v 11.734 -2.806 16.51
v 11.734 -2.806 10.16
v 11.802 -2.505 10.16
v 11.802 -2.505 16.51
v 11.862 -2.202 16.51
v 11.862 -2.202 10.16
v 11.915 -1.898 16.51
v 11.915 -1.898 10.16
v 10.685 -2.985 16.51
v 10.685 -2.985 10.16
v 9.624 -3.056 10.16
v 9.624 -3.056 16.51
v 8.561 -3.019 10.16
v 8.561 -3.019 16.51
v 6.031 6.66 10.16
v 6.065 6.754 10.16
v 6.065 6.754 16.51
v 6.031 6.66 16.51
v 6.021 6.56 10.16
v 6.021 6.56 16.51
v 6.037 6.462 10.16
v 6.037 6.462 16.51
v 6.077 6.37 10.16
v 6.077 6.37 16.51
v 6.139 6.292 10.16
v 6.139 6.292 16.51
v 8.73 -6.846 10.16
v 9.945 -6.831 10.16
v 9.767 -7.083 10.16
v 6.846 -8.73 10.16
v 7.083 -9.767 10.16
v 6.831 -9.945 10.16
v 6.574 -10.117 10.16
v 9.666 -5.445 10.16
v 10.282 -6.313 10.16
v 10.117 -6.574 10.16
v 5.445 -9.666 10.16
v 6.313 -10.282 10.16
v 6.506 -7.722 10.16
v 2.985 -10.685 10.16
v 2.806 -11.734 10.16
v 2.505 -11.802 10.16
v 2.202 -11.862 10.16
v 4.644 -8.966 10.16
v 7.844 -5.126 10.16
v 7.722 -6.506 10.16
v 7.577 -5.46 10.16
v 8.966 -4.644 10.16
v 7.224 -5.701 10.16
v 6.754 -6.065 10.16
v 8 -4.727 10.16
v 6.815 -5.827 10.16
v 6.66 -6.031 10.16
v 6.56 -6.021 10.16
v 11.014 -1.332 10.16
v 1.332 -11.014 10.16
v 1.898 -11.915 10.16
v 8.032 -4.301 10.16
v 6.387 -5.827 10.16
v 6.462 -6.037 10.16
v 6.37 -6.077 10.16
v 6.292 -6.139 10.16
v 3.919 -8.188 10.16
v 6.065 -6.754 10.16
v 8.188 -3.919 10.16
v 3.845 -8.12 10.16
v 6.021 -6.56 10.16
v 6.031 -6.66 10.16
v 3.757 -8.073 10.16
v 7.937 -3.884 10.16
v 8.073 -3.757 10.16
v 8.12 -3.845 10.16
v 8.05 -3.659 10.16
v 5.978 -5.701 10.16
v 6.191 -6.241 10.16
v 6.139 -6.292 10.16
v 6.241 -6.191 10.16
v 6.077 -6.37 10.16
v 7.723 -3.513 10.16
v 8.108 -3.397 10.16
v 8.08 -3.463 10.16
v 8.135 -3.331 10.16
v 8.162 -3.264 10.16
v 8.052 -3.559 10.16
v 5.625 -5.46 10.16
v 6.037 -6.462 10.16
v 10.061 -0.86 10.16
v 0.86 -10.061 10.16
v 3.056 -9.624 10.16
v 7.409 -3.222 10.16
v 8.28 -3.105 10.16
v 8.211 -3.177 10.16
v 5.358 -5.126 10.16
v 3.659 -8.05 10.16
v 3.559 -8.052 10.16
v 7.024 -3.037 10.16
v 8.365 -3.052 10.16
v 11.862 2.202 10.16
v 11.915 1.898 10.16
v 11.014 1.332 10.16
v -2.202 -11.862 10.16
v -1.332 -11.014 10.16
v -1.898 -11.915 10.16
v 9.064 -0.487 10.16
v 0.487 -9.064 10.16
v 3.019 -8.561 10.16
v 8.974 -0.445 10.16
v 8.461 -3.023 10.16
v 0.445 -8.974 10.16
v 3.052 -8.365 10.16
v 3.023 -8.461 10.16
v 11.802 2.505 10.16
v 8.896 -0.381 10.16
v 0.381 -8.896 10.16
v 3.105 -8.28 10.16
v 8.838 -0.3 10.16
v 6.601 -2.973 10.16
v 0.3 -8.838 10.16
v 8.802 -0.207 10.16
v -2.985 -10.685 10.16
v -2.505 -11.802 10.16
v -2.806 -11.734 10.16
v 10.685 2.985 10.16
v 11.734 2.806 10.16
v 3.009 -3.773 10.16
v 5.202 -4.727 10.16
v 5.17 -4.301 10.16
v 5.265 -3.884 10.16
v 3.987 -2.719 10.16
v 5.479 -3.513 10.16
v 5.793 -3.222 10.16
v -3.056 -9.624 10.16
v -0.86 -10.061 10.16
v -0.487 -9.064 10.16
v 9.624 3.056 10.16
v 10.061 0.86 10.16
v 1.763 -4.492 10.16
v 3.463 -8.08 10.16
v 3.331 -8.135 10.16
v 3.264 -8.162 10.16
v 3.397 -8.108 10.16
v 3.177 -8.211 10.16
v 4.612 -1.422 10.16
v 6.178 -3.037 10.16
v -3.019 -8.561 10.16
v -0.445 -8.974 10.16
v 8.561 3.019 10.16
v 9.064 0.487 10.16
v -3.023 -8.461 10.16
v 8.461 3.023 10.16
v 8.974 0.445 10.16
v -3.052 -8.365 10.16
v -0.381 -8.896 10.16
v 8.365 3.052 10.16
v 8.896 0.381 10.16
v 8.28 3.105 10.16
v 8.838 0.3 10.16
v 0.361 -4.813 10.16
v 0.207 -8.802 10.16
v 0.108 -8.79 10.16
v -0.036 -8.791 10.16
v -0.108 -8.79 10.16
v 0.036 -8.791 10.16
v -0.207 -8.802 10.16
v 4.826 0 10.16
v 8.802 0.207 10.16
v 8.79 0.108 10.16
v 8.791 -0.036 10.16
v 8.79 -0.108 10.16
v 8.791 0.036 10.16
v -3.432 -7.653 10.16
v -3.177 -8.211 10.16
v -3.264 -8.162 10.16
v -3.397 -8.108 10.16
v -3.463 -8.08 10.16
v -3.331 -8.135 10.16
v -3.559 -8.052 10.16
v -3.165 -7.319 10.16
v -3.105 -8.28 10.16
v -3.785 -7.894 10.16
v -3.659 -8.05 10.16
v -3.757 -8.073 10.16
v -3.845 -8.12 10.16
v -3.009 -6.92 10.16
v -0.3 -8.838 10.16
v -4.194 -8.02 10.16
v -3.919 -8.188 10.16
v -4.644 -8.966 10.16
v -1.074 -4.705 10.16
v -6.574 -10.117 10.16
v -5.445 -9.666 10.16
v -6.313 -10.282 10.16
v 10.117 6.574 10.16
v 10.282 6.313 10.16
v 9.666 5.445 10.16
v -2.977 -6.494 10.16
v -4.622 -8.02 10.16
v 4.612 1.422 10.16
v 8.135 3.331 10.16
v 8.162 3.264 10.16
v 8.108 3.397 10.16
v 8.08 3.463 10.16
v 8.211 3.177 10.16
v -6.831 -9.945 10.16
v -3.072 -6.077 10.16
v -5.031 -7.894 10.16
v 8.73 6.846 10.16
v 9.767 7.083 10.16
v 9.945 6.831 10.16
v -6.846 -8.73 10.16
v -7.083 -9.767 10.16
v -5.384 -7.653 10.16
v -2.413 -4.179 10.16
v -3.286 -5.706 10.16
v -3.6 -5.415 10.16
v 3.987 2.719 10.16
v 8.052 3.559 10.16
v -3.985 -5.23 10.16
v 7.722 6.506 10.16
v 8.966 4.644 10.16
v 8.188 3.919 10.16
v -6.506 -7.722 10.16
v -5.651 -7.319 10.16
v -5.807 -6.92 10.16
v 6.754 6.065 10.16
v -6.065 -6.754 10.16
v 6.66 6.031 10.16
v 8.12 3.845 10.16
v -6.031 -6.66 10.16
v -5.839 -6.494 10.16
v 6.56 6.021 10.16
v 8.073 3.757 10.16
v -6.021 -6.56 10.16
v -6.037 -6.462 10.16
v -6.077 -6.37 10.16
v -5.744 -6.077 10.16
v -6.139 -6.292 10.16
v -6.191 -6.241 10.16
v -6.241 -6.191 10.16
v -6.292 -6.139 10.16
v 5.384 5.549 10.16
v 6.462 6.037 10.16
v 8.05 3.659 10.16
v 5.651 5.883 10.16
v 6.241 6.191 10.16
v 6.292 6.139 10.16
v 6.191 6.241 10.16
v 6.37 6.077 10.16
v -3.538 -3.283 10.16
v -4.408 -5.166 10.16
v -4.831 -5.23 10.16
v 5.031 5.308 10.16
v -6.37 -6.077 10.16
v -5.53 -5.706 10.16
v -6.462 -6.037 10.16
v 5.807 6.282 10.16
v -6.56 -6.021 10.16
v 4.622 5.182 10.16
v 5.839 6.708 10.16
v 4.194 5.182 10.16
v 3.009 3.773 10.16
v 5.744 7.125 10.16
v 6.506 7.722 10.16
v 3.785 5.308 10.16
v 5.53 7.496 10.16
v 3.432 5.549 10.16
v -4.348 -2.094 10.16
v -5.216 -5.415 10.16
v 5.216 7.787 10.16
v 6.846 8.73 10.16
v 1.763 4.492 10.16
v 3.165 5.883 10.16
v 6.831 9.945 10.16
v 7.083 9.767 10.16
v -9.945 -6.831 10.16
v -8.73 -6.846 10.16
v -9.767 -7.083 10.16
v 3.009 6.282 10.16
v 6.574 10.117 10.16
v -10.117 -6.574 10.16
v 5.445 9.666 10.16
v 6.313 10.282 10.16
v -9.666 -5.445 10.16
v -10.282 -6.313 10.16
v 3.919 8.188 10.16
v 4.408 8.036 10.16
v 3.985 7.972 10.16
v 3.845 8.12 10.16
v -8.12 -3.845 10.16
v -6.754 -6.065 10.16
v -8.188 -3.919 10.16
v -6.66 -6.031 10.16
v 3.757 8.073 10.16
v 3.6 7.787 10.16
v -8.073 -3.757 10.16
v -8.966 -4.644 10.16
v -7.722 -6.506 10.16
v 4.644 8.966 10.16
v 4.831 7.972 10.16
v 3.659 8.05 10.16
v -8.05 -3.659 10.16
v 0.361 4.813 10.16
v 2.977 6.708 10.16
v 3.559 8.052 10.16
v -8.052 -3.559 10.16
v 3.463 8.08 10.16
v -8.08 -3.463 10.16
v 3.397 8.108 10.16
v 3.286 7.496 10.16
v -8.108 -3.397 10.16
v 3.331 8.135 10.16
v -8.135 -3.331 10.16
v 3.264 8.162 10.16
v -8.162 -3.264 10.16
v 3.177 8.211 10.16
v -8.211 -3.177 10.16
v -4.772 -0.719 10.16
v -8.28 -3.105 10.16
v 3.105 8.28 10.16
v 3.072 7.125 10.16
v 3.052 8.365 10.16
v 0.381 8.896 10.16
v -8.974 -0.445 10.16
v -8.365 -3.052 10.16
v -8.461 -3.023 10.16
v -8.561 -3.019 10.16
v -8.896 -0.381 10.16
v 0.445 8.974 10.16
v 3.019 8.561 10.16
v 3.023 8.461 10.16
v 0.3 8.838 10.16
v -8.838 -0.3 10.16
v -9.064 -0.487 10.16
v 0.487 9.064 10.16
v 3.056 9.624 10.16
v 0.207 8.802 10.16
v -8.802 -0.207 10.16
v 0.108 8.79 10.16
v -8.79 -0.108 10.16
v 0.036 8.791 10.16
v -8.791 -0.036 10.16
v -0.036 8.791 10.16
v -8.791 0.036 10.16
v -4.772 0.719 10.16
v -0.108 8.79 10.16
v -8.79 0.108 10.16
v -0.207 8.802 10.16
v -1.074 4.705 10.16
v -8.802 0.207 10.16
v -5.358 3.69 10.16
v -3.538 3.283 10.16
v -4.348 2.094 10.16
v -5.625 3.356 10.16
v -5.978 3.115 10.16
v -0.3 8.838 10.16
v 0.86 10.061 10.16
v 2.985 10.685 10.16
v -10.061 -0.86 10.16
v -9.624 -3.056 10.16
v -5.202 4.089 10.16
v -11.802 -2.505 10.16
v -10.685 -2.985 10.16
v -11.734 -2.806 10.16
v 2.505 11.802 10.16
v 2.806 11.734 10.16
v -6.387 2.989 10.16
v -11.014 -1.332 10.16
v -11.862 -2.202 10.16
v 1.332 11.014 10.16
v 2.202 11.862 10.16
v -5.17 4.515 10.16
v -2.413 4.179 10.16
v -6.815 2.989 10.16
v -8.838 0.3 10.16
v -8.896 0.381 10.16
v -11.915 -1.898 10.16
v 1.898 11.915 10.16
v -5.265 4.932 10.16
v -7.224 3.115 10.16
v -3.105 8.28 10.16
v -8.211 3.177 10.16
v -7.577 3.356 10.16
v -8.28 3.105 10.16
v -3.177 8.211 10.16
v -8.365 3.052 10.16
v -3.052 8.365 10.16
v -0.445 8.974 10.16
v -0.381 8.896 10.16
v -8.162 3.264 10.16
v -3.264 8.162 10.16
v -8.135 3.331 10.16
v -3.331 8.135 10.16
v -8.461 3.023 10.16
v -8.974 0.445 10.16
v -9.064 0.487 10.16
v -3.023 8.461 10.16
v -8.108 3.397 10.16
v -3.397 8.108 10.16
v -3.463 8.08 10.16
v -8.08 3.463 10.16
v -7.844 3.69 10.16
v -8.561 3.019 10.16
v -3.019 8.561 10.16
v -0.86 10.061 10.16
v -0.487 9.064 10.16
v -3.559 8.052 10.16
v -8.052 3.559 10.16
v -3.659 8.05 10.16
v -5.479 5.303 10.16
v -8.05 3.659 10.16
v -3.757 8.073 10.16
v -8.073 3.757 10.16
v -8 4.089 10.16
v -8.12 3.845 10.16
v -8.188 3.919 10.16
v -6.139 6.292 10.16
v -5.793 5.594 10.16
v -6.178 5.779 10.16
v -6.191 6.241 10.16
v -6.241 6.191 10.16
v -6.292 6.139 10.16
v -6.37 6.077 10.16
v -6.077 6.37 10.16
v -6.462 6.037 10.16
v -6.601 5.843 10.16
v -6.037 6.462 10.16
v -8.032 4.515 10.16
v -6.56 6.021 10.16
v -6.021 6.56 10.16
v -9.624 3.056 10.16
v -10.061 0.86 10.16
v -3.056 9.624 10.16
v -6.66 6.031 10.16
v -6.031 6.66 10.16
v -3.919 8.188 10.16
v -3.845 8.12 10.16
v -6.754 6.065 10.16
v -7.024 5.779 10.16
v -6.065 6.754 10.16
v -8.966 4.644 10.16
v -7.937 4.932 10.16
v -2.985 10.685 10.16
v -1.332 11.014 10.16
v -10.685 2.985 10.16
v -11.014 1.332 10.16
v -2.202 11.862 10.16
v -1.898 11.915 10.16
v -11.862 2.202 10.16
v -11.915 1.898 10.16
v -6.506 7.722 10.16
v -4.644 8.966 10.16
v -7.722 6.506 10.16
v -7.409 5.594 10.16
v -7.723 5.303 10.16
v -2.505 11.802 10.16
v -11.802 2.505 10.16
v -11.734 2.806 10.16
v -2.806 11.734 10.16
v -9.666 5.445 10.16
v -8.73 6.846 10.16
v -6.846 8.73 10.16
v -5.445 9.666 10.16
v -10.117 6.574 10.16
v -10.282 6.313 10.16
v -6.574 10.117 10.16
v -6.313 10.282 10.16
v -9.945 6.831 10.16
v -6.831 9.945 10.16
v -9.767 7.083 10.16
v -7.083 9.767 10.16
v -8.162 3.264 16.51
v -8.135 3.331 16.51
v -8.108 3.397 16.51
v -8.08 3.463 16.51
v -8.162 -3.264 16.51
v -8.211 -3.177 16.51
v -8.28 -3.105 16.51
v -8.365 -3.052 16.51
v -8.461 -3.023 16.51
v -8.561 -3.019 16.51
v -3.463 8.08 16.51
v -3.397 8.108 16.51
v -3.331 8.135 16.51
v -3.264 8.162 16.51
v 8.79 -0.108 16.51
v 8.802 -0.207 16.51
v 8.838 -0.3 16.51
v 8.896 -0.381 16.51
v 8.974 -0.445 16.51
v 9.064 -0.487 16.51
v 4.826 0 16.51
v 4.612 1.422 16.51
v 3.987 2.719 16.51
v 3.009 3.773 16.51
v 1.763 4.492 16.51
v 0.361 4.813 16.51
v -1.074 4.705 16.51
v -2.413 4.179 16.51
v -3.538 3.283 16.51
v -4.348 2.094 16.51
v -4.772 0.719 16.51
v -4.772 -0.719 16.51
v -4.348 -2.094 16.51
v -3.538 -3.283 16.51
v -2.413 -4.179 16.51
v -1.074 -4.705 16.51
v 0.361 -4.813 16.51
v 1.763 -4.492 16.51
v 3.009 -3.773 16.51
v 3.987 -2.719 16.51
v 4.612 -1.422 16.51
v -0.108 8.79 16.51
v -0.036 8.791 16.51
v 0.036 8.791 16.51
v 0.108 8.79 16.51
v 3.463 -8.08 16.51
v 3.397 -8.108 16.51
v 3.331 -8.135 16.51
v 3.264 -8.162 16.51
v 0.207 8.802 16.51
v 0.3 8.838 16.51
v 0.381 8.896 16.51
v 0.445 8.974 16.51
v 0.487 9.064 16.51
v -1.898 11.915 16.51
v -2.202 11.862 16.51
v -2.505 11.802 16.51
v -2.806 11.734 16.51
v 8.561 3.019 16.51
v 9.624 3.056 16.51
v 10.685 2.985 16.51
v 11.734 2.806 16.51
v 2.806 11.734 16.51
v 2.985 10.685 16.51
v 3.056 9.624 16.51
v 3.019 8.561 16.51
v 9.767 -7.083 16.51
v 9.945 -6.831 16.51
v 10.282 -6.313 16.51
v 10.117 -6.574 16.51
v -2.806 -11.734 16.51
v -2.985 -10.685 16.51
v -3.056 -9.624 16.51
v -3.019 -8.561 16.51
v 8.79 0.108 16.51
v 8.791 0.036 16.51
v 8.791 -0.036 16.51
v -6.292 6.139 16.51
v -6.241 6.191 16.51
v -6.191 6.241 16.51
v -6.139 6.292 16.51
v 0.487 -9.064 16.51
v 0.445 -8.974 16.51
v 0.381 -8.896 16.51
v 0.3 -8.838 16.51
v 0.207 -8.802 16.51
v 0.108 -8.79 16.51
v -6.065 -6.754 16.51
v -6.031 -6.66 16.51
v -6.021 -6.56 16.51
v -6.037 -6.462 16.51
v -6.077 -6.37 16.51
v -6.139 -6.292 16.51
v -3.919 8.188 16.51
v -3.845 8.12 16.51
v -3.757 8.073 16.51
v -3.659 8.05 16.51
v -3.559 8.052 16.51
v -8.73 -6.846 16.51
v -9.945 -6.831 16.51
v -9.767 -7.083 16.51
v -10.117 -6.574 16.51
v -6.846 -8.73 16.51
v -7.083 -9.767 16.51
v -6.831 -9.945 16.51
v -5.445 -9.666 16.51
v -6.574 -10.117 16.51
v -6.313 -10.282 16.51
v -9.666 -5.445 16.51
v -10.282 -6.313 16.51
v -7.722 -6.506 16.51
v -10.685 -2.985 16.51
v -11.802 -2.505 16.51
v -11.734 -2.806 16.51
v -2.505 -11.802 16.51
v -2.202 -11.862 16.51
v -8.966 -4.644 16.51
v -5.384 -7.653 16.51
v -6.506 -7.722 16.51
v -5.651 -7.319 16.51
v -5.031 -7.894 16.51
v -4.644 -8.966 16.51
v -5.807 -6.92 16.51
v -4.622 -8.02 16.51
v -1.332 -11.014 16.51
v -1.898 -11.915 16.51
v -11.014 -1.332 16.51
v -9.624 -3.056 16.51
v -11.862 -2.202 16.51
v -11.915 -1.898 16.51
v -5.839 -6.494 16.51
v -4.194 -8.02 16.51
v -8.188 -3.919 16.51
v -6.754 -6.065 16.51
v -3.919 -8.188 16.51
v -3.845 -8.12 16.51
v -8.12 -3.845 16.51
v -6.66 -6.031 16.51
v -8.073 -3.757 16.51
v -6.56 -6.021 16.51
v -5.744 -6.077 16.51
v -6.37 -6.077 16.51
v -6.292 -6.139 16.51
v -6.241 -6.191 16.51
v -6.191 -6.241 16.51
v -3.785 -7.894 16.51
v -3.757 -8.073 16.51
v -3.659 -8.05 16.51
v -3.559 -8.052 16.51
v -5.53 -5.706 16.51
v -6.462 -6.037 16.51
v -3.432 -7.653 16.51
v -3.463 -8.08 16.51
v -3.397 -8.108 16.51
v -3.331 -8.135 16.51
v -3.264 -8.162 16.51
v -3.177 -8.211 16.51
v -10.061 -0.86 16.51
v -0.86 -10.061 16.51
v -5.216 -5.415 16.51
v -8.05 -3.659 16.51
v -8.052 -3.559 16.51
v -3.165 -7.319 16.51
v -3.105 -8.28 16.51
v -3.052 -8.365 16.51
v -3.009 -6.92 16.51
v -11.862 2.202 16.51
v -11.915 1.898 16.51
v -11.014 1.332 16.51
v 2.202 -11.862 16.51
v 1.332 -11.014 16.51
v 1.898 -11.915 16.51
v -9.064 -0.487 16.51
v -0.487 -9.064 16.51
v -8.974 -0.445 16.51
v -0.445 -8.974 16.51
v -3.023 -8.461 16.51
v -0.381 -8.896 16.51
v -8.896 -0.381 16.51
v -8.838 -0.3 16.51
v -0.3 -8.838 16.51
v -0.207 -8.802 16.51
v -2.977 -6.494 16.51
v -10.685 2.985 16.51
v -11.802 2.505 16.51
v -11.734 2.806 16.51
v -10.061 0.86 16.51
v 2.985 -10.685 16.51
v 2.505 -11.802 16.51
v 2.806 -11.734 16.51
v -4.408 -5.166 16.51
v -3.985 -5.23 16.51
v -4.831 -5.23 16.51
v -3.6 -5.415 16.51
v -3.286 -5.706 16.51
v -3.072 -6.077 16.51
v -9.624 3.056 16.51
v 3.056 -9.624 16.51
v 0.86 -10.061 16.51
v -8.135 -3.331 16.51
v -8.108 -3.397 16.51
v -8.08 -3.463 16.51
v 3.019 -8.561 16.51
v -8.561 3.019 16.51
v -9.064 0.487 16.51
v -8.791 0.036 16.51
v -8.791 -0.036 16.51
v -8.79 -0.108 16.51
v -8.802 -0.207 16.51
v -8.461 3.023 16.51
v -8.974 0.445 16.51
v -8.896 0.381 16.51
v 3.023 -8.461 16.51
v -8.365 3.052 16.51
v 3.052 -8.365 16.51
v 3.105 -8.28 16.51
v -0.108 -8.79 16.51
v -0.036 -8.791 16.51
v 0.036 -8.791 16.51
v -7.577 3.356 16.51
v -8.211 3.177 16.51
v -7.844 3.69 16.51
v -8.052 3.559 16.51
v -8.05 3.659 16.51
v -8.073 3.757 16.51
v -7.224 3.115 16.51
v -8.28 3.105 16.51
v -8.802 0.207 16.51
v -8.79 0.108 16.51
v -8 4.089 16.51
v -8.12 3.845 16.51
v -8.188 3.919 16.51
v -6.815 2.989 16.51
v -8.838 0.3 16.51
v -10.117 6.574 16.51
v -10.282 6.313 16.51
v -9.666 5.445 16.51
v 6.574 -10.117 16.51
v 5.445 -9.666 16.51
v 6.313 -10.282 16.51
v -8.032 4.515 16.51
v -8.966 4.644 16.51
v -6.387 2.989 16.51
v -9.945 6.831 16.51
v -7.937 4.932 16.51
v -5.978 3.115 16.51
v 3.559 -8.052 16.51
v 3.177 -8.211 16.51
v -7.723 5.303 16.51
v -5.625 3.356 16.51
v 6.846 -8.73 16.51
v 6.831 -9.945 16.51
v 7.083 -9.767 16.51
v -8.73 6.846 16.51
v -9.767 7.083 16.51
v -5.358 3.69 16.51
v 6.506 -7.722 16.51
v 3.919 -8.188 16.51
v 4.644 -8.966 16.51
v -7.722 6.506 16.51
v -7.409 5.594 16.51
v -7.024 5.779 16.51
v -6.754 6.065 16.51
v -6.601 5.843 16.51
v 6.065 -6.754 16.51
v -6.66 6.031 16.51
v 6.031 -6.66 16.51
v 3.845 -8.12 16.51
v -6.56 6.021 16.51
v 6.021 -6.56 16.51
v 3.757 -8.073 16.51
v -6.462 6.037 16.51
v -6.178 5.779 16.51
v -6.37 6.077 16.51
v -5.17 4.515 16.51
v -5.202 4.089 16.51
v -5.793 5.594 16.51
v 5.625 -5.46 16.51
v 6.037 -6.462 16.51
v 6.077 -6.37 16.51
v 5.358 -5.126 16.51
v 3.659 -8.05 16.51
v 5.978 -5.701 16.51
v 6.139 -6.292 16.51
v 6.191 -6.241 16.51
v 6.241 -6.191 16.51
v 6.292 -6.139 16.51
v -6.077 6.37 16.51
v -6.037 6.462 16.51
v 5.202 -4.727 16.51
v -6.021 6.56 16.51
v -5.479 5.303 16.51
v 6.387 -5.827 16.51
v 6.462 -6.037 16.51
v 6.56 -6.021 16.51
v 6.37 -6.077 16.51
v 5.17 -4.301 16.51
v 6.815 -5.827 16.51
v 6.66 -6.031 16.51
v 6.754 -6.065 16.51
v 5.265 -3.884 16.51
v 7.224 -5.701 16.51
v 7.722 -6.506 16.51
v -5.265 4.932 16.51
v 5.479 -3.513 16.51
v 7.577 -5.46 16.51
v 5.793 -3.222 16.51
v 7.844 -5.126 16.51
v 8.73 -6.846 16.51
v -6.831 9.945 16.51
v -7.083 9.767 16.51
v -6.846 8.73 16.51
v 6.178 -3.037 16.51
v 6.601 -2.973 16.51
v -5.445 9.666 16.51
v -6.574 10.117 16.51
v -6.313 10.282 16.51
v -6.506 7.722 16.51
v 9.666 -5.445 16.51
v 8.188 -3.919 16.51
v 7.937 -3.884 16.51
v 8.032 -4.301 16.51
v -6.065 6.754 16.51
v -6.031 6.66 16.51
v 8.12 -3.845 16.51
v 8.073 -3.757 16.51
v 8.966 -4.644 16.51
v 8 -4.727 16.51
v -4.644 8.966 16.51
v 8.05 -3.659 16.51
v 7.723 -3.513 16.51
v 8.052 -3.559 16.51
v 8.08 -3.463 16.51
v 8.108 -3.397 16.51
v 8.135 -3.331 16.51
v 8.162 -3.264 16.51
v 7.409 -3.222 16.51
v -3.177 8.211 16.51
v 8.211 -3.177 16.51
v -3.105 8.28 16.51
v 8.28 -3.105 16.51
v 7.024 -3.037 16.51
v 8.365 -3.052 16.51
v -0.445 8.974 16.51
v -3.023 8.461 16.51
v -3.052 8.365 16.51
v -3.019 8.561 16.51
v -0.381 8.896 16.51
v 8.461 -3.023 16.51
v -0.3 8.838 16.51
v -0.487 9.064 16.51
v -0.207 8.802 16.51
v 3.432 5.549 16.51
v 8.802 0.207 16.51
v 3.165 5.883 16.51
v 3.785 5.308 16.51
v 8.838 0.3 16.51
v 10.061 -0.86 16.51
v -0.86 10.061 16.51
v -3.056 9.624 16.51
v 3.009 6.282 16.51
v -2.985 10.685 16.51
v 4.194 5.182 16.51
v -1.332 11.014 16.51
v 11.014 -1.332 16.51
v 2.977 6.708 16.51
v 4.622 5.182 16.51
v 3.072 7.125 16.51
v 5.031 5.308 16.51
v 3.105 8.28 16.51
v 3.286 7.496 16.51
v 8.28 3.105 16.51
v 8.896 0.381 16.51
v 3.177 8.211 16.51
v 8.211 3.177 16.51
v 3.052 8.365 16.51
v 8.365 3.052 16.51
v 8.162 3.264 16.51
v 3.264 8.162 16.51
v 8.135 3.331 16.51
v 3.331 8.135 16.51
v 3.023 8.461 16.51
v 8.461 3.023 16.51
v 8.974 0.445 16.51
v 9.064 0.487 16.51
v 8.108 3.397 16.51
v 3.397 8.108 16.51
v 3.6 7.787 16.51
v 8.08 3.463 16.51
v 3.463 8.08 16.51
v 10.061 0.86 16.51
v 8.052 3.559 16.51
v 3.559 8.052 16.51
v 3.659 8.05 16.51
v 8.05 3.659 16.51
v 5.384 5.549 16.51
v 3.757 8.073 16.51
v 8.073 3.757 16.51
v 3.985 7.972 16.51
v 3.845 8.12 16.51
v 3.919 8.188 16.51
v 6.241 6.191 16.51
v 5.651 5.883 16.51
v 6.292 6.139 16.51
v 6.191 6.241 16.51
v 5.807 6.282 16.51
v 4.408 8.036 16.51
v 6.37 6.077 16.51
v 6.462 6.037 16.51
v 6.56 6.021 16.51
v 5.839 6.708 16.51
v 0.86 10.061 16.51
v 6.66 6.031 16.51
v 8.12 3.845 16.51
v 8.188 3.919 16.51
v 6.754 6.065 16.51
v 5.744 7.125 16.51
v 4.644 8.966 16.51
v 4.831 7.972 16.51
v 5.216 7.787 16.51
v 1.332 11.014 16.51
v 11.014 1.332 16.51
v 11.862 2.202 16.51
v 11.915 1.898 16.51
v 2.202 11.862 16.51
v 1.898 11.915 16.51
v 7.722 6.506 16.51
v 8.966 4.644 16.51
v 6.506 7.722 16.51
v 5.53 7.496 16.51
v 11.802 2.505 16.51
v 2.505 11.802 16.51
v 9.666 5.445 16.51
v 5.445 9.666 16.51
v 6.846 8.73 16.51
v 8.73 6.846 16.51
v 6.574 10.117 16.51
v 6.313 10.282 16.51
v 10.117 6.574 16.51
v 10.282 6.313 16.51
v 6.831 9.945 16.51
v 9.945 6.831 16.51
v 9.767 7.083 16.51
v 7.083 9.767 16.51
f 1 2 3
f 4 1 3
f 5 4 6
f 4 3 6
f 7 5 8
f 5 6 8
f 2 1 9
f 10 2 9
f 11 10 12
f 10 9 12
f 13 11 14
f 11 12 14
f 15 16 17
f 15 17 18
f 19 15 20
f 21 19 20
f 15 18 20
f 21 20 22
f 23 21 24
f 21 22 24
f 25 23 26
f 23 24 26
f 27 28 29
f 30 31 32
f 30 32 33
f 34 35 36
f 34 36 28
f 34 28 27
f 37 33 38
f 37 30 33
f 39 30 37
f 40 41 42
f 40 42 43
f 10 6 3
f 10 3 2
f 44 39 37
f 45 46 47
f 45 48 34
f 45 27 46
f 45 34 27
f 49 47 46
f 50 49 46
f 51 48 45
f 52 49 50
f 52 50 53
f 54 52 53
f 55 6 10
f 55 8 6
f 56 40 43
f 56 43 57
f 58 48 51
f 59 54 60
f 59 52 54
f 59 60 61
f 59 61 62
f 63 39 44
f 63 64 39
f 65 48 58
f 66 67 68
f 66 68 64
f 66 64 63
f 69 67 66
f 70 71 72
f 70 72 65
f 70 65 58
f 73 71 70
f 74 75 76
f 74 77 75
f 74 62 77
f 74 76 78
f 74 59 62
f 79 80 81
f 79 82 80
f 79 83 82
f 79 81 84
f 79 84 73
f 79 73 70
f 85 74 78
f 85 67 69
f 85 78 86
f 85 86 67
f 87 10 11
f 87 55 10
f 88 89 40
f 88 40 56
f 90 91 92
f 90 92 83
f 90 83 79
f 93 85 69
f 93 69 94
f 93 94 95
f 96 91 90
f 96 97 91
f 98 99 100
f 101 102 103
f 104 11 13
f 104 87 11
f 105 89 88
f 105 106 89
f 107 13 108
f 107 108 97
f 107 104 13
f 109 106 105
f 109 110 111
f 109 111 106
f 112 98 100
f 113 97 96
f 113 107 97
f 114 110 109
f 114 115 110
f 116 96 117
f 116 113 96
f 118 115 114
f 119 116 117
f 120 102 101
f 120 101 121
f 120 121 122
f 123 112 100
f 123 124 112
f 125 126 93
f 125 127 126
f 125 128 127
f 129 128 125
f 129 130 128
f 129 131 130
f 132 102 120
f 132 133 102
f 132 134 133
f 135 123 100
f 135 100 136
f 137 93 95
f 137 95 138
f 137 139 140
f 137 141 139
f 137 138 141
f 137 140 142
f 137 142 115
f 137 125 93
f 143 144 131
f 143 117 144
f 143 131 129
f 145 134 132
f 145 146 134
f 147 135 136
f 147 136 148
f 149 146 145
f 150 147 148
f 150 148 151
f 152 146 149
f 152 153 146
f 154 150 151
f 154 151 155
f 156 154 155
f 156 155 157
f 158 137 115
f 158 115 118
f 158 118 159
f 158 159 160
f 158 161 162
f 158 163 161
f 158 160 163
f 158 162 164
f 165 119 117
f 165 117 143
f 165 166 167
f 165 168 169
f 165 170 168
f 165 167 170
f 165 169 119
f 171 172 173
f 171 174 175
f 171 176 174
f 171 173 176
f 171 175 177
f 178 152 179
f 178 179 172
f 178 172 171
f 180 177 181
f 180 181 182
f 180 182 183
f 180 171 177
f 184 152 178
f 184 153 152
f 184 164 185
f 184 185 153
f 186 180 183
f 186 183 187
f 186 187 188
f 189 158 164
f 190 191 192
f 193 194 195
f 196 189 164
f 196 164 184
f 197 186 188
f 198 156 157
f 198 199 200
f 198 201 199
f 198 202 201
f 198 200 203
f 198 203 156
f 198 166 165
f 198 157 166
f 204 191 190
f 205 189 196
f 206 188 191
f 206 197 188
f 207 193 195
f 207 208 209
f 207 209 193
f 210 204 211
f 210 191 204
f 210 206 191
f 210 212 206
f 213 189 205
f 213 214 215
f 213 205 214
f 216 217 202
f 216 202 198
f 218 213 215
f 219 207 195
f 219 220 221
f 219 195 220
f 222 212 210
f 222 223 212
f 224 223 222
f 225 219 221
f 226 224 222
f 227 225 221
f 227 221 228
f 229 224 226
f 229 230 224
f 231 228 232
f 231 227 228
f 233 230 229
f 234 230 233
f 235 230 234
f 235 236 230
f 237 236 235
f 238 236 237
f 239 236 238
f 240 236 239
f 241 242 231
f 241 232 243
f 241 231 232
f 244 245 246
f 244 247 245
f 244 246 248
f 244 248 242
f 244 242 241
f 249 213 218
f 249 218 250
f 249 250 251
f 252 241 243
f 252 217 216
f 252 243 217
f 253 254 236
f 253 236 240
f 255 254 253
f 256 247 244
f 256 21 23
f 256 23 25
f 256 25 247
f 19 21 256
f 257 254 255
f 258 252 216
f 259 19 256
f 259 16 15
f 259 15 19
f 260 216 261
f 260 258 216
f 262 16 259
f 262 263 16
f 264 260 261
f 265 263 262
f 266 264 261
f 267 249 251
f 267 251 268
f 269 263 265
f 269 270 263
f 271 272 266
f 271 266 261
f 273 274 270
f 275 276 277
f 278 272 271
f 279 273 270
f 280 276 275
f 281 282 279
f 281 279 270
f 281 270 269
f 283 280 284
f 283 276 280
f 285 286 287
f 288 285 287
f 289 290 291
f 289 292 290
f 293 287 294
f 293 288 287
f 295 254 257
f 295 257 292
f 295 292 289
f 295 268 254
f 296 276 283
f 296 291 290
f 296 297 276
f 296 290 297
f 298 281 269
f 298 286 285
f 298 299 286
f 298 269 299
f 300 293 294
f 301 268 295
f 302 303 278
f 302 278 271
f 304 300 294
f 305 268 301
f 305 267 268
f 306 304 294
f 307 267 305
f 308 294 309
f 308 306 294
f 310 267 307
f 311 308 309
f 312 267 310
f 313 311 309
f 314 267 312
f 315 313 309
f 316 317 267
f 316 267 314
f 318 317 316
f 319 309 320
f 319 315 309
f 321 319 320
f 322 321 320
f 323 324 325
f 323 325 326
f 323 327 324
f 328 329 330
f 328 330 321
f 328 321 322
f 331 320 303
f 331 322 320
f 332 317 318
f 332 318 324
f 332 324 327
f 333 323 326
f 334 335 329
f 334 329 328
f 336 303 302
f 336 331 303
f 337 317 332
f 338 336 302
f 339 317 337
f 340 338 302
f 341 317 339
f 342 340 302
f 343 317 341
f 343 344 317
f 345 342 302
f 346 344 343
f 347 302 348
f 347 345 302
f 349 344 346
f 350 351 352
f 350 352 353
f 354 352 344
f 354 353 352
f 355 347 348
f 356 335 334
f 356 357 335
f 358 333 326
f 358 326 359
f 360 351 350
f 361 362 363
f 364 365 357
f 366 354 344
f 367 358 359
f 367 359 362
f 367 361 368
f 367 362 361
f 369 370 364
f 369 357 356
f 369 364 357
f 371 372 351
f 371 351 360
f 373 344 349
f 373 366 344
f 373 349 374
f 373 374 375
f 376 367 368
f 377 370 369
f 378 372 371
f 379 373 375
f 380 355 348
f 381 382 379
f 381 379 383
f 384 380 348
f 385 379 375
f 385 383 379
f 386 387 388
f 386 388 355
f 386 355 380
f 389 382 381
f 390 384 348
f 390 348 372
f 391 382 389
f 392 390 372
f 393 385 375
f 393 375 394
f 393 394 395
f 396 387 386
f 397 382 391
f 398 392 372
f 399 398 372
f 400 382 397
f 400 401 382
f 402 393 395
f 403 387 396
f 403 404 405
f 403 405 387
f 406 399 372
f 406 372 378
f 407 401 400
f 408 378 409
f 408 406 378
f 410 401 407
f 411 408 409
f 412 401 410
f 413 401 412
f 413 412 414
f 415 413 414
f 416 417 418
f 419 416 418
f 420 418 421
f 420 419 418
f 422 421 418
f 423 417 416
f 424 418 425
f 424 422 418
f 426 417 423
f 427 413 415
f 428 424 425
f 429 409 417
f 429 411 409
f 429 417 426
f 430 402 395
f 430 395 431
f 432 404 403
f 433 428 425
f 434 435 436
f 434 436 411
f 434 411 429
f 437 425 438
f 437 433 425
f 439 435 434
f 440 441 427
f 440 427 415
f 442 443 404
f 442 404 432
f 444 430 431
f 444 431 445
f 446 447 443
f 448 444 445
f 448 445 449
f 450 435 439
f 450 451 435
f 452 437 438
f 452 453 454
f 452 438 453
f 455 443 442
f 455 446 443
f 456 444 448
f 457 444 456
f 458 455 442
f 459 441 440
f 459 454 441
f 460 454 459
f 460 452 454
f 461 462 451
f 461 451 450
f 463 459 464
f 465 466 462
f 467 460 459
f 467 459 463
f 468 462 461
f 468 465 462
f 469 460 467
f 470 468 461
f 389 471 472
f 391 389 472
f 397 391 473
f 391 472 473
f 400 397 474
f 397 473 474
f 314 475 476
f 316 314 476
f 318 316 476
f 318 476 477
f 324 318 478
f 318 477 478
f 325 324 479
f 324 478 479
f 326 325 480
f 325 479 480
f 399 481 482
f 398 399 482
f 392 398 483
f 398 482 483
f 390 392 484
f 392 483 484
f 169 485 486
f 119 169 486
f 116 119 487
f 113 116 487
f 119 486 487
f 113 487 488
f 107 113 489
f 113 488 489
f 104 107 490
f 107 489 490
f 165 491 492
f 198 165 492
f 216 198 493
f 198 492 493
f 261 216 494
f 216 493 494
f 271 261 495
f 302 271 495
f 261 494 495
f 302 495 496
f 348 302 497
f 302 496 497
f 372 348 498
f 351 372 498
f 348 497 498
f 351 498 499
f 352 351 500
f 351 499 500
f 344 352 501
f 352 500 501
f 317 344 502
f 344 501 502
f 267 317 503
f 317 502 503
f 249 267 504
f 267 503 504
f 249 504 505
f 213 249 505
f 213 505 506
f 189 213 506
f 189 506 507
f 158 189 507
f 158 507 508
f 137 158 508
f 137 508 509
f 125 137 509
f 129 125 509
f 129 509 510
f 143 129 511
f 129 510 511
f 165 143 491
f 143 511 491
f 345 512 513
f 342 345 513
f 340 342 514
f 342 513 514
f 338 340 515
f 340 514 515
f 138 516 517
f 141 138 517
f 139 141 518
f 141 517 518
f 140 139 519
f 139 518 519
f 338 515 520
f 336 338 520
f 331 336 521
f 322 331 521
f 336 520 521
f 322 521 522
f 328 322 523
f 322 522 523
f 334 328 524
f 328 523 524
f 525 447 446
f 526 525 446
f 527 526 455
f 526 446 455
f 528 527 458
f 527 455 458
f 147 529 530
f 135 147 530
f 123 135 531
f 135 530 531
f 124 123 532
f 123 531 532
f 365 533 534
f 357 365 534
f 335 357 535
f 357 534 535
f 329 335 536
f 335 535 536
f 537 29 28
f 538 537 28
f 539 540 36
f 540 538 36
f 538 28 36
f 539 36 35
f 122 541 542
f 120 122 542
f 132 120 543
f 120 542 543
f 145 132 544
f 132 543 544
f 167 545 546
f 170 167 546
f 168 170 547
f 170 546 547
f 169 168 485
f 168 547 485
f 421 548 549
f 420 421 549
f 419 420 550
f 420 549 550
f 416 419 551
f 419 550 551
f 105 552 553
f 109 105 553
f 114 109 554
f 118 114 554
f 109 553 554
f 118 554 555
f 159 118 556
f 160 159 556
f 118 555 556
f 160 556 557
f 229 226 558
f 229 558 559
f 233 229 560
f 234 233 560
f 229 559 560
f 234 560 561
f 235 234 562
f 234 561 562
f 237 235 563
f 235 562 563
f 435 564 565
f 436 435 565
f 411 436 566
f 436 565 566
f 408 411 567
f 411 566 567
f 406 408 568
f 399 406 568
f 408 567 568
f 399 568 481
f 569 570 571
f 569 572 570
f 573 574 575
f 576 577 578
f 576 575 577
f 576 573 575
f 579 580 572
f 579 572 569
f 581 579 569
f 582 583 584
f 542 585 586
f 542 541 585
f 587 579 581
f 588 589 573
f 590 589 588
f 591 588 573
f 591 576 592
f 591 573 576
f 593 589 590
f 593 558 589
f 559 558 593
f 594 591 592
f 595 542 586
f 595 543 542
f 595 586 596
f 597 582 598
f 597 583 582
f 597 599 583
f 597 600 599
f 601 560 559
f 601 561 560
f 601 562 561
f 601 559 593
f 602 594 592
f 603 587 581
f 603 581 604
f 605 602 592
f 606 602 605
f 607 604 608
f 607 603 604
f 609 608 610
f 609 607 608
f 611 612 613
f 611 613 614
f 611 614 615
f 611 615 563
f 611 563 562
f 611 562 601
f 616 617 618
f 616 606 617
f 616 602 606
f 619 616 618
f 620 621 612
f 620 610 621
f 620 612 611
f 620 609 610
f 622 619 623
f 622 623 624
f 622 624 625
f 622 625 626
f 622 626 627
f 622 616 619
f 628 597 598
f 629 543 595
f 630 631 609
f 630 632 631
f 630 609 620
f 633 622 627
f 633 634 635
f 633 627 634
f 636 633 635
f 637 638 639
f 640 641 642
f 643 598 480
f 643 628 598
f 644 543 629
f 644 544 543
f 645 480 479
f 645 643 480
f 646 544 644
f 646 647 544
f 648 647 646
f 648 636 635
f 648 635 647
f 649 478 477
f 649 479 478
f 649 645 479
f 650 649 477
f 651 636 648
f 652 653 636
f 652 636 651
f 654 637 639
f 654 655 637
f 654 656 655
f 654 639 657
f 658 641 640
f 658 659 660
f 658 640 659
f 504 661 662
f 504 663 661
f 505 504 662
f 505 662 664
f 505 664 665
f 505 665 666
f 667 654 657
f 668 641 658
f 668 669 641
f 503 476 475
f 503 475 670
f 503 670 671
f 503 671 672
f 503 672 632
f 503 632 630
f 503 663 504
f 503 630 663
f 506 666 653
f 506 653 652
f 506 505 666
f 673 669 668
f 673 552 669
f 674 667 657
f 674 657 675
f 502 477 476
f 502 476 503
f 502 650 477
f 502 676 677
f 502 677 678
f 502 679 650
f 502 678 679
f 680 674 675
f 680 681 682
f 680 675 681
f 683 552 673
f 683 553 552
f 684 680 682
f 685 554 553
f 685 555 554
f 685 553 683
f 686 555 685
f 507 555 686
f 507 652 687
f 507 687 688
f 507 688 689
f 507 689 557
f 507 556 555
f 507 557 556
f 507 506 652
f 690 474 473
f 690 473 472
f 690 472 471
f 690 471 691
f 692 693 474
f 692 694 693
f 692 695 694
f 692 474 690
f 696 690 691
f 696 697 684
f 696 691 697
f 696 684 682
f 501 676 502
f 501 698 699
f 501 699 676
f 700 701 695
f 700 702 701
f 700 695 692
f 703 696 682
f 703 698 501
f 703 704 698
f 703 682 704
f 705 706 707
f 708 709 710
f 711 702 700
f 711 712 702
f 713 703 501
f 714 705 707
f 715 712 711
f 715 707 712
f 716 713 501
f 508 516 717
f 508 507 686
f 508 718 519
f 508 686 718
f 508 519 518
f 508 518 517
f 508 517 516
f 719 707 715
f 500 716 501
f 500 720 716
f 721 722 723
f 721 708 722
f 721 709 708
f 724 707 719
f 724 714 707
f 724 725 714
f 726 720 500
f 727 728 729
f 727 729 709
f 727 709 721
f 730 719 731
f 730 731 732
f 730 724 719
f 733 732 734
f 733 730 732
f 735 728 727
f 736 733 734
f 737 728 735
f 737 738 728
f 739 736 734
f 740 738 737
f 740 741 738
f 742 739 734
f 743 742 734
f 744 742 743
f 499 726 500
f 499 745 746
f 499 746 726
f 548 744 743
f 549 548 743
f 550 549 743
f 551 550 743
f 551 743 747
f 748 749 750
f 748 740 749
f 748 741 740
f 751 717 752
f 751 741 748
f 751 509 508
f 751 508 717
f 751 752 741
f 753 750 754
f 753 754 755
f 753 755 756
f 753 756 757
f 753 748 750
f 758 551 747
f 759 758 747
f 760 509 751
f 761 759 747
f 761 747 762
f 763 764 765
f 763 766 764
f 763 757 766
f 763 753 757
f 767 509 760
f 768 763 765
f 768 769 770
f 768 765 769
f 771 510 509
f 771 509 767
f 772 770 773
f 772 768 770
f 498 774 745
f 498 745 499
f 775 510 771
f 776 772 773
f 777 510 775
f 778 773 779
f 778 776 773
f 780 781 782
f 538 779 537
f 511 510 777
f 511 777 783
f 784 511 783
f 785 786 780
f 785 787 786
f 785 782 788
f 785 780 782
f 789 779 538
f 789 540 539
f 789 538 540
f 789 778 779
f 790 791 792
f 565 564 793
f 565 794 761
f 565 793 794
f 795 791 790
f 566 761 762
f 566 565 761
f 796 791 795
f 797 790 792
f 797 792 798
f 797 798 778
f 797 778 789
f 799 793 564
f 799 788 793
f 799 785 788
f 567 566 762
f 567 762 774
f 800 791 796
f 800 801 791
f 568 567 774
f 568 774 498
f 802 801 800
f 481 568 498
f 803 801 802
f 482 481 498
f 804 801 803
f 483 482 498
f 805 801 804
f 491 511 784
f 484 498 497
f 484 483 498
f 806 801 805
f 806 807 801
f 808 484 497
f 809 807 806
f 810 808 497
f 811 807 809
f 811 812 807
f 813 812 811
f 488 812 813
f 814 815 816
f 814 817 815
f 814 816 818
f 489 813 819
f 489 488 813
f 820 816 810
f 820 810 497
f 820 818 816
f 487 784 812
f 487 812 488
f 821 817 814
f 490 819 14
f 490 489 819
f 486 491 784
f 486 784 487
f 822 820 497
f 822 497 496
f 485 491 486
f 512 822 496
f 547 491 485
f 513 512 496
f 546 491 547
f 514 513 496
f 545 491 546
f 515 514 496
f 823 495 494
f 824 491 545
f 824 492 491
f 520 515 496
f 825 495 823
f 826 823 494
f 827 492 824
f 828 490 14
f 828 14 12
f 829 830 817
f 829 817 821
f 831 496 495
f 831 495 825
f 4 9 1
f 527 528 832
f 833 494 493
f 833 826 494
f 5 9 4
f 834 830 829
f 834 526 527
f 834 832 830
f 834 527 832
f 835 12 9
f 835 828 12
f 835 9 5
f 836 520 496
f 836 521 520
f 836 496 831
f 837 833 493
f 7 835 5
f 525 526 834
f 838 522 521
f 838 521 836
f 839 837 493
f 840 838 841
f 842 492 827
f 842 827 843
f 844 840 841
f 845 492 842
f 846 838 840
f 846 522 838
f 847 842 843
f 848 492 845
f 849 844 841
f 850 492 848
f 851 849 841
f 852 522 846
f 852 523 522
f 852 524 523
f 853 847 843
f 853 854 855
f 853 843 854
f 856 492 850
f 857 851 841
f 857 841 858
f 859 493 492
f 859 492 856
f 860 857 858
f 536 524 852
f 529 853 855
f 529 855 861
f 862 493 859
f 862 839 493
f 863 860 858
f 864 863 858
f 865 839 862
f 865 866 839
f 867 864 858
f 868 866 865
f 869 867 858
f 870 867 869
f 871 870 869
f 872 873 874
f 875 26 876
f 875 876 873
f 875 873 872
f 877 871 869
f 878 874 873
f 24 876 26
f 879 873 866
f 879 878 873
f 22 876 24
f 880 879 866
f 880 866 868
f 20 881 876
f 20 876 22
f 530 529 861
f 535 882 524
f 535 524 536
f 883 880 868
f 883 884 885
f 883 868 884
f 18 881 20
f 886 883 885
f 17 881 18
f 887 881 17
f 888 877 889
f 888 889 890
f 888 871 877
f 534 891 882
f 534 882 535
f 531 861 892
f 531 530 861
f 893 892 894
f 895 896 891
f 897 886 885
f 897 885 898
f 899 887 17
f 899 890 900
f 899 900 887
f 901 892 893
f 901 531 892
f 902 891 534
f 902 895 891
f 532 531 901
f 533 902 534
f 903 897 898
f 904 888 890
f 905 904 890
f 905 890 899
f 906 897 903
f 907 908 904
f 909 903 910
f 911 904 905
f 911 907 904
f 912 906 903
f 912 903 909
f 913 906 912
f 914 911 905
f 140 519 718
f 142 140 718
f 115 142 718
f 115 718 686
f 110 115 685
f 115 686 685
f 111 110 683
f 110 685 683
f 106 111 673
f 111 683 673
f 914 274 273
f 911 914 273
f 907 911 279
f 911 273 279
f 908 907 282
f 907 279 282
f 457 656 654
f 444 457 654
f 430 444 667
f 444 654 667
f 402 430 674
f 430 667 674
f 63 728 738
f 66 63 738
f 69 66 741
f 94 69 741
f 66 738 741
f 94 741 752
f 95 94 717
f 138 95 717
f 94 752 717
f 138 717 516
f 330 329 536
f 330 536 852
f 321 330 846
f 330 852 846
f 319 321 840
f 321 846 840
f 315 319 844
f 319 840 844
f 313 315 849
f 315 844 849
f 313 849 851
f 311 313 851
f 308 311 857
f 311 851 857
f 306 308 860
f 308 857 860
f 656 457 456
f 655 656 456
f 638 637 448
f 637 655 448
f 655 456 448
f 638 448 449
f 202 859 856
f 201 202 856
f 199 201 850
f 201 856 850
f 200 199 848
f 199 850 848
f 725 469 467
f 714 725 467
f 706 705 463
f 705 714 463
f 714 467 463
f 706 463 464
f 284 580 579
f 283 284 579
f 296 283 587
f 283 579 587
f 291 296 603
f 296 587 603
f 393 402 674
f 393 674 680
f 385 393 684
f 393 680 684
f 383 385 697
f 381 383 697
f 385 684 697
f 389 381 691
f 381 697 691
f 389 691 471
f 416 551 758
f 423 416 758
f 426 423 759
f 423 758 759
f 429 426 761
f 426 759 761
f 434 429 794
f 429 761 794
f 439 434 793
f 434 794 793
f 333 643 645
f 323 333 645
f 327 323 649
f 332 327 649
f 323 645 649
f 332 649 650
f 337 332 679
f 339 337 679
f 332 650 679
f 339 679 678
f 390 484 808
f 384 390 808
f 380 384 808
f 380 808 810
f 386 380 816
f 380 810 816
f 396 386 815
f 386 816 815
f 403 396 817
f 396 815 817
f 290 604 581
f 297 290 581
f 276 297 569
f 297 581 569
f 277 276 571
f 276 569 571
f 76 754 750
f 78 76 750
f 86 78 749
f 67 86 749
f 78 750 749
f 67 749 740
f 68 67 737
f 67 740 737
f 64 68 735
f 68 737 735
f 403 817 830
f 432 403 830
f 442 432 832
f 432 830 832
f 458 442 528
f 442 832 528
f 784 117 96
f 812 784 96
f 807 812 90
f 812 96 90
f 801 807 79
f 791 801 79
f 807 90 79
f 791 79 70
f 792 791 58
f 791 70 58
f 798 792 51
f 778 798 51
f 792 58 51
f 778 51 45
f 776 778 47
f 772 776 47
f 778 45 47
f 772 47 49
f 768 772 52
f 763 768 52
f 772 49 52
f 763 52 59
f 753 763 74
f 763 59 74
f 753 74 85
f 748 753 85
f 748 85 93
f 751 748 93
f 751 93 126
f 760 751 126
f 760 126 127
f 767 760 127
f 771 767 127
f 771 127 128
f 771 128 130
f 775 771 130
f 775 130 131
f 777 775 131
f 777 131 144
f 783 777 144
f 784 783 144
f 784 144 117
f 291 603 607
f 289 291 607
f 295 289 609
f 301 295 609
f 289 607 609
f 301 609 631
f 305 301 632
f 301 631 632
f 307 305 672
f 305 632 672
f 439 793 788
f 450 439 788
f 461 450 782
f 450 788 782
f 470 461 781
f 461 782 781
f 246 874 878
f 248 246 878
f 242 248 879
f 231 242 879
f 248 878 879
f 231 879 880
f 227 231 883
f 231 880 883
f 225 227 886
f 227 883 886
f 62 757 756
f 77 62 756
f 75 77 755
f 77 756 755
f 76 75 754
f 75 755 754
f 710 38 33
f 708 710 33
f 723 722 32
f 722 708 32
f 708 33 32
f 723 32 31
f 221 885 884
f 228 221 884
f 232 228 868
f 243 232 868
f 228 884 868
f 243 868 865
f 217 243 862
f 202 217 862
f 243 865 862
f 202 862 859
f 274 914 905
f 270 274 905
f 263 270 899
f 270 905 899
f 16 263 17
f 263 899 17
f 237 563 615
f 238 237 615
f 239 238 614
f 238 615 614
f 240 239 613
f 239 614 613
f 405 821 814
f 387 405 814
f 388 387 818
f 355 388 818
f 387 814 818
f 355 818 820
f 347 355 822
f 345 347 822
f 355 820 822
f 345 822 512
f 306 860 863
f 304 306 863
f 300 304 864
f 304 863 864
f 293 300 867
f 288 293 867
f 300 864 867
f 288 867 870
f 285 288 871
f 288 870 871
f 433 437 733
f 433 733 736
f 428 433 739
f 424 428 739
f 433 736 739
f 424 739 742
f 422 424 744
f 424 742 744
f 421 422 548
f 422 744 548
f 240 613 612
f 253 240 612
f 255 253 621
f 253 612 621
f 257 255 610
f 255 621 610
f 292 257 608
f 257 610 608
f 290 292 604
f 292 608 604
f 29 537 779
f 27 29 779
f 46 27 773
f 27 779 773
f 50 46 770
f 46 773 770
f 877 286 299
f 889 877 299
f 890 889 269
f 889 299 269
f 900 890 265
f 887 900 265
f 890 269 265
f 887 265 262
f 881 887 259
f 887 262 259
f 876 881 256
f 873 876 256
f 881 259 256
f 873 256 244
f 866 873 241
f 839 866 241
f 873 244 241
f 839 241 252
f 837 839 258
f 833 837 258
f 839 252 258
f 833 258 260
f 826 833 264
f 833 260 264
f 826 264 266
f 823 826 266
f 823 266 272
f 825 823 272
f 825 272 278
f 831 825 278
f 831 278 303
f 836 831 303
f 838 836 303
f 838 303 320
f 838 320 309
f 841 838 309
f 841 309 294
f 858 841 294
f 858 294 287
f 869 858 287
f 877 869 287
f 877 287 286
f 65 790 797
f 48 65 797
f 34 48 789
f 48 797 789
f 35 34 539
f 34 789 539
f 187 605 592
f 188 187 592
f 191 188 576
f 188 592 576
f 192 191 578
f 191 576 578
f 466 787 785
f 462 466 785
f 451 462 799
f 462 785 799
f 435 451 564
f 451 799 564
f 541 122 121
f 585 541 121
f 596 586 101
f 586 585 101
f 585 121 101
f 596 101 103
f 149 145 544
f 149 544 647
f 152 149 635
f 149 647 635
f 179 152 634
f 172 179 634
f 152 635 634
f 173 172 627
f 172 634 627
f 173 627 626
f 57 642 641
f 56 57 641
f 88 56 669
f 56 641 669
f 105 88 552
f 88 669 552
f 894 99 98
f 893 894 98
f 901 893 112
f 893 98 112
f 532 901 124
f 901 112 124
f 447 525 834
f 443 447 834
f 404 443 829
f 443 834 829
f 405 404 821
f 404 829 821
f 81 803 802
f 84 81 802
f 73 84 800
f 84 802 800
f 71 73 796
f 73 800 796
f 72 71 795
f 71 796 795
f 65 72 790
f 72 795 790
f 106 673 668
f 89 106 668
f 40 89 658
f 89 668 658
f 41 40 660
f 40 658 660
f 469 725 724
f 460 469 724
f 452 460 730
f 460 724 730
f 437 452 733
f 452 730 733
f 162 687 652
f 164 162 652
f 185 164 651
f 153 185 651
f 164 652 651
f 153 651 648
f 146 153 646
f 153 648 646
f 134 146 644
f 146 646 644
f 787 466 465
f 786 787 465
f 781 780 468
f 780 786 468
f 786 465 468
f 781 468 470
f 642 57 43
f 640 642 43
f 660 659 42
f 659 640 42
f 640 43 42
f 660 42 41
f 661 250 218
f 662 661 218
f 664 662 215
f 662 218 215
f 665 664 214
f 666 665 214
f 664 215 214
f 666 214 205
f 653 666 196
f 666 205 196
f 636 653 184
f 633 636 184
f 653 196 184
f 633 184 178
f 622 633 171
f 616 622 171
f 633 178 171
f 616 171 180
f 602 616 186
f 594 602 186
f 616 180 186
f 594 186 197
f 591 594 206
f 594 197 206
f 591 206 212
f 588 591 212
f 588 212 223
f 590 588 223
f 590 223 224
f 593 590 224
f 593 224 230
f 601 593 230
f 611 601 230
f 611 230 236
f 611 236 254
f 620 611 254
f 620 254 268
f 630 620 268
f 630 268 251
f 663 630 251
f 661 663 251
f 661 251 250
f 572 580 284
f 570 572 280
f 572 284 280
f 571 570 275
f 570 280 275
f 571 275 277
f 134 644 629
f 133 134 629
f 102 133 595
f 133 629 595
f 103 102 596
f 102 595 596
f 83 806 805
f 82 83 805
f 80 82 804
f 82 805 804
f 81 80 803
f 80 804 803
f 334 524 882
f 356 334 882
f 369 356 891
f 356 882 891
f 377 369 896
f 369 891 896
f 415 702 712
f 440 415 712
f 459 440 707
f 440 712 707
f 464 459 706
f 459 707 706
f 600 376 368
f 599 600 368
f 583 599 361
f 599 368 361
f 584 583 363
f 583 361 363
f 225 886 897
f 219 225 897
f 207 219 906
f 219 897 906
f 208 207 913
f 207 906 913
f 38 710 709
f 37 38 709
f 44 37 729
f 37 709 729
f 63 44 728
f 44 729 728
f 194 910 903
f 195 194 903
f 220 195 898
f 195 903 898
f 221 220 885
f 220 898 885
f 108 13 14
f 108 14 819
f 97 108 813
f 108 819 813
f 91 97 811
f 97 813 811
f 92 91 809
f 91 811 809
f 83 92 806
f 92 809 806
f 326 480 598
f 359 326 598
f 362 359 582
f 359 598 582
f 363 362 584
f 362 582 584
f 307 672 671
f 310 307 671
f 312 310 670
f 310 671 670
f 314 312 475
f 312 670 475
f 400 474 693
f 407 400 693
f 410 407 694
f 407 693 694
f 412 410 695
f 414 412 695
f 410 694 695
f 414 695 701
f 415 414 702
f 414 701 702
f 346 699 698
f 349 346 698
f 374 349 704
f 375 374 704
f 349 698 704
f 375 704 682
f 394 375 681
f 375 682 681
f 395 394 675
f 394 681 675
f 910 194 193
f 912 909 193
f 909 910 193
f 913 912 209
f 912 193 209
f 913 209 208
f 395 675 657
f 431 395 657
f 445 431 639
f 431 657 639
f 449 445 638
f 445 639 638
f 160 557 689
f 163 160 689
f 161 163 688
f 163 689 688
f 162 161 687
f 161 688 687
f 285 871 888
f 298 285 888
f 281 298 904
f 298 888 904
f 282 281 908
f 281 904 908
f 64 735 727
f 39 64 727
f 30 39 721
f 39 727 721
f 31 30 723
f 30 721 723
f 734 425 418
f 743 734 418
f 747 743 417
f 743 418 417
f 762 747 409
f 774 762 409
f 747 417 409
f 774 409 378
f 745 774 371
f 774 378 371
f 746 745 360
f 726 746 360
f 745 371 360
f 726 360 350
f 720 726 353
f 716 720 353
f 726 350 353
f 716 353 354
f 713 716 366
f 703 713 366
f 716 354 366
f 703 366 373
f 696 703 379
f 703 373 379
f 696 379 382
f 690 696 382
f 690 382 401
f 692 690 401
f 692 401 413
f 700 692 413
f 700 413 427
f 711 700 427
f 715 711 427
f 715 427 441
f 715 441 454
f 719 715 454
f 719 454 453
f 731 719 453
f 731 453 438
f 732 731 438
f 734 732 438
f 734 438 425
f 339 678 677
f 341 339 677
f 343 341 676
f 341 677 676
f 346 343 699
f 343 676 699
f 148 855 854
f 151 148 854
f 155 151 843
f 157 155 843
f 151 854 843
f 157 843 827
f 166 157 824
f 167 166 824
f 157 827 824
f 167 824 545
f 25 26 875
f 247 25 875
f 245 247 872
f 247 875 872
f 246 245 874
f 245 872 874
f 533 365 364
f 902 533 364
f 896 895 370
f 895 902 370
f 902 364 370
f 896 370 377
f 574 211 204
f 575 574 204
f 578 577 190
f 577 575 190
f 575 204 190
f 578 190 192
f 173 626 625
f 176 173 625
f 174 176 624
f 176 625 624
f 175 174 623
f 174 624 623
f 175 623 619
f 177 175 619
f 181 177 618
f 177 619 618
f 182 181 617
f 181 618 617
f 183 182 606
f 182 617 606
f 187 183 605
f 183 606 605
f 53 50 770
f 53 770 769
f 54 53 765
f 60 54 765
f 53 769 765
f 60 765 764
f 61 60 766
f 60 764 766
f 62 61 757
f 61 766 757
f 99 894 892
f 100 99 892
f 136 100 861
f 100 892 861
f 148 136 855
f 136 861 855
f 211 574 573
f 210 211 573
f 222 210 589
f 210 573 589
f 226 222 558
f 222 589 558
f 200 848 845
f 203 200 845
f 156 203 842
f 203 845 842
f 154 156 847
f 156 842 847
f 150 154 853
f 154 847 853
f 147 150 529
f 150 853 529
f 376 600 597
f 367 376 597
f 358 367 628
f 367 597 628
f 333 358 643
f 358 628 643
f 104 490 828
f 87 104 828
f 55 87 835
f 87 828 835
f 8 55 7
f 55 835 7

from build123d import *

# Parameters (mm, degrees)
FILLET2_R           = 0.2413
CUT_EXTRUDE2_DEPTH  = 26.574028913
CIRPATTERN1_COUNT   = 16
SKETCH10_R          = 29.093421686
CUT_EXTRUDE3_DEPTH  = 15.24
SKETCH11_R          = 20.555223038
CUT_EXTRUDE4_DEPTH  = 10.16
SKETCH12_R          = 7.917123479
SKETCH12_R_2        = 4.826
BOSS_EXTRUDE1_DEPTH = 6.35
SKETCH_1_R          = 1.4351
CUT_EXTRUDE_1_DEPTH = 24.590352248


with BuildPart() as part:
    # Sketch4 → Revolve1 (revolve)
    with BuildSketch(Plane(origin=(0, 0, 0), x_dir=(0, 0, -1), z_dir=(1, 0, 0))):
        Polygon((-31.75, 6.35), (-31.75, 10.3251), (-19.05, 10.3251), (-19.05, 12.065), (0, 12.065), (0, 6.35), align=None)
    revolve(axis=Axis((0, 0, 19.05), (0, 0, 1)))

    # Fillet2
    fillet2_edges = [part.edges().sort_by_distance(p)[0] for p in [
        (0, -12.065, 0),
        (0, -12.065, 19.05),
        (0, -10.3251, 19.05),
        (0, -10.3251, 31.75),
    ]]
    fillet(fillet2_edges, radius=FILLET2_R)

    # Sketch7 → Cut-Extrude2 (cut, through all)
    with BuildSketch(Plane.XY.offset(19.05)):
        with BuildLine():
            ThreePointArc((-0.107661594, 8.790121954), (0, 8.79078125), (0.107661594, 8.790121954))
            ThreePointArc((0.107661594, 8.790121954), (0.342591452, 8.864525037), (0.487011309, 9.064201678))
            ThreePointArc((0.487011309, 9.064201678), (1.083642605, 10.543346068), (1.897871283, 11.914793728))
            ThreePointArc((1.897871283, 11.914793728), (0, 12.065), (-1.897871283, 11.914793728))
            ThreePointArc((-1.897871283, 11.914793728), (-1.083642605, 10.543346068), (-0.487011309, 9.064201678))
            ThreePointArc((-0.487011309, 9.064201678), (-0.342591452, 8.864525037), (-0.107661594, 8.790121954))
        make_face()
    cut_extrude2 = extrude(amount=-CUT_EXTRUDE2_DEPTH, mode=Mode.SUBTRACT)

    # CirPattern1: Cut-Extrude2 ×16 about axis
    cirpattern1_axis = Axis((0, 0, 0), (0, 0, 1))
    for i in range(1, CIRPATTERN1_COUNT):
        add(cut_extrude2.rotate(cirpattern1_axis, i * 360 / CIRPATTERN1_COUNT), mode=Mode.SUBTRACT)

    # Sketch10 → Cut-Extrude3 (cut)
    with BuildSketch(Plane.XY.offset(31.75)):
        Circle(SKETCH10_R)
    extrude(amount=-CUT_EXTRUDE3_DEPTH, mode=Mode.SUBTRACT)

    # Sketch11 → Cut-Extrude4 (cut)
    with BuildSketch(Plane(origin=(0, 0, 0), x_dir=(-1, 0, 0), z_dir=(0, 0, -1))):
        Circle(SKETCH11_R)
    extrude(amount=-CUT_EXTRUDE4_DEPTH, mode=Mode.SUBTRACT)

    # Sketch12 → Boss-Extrude1 (add)
    with BuildSketch(Plane.XY.offset(16.51)):
        Circle(SKETCH12_R)
        Circle(SKETCH12_R_2, mode=Mode.SUBTRACT)
    extrude(amount=-BOSS_EXTRUDE1_DEPTH)

    # Эскиз1 → Вырез-Вытянуть1 (cut, through all)
    with BuildSketch(Plane(origin=(0, 0, 0), x_dir=(-1, 0, 0), z_dir=(0, 0, -1))):
        with Locations(Location((6.601034981, 4.40797498, 0), (0, 0, 90))):
            Circle(SKETCH_1_R)
        with Locations(Location((4.40797498, -6.601034981, 0), (0, 0, 90))):
            Circle(SKETCH_1_R)
        with Locations(Location((-6.601034981, -4.40797498, 0), (0, 0, 90))):
            Circle(SKETCH_1_R)
        with Locations(Location((-4.40797498, 6.601034981, 0), (0, 0, 90))):
            Circle(SKETCH_1_R)
    extrude(amount=-CUT_EXTRUDE_1_DEPTH, mode=Mode.SUBTRACT)


solid = part.part
